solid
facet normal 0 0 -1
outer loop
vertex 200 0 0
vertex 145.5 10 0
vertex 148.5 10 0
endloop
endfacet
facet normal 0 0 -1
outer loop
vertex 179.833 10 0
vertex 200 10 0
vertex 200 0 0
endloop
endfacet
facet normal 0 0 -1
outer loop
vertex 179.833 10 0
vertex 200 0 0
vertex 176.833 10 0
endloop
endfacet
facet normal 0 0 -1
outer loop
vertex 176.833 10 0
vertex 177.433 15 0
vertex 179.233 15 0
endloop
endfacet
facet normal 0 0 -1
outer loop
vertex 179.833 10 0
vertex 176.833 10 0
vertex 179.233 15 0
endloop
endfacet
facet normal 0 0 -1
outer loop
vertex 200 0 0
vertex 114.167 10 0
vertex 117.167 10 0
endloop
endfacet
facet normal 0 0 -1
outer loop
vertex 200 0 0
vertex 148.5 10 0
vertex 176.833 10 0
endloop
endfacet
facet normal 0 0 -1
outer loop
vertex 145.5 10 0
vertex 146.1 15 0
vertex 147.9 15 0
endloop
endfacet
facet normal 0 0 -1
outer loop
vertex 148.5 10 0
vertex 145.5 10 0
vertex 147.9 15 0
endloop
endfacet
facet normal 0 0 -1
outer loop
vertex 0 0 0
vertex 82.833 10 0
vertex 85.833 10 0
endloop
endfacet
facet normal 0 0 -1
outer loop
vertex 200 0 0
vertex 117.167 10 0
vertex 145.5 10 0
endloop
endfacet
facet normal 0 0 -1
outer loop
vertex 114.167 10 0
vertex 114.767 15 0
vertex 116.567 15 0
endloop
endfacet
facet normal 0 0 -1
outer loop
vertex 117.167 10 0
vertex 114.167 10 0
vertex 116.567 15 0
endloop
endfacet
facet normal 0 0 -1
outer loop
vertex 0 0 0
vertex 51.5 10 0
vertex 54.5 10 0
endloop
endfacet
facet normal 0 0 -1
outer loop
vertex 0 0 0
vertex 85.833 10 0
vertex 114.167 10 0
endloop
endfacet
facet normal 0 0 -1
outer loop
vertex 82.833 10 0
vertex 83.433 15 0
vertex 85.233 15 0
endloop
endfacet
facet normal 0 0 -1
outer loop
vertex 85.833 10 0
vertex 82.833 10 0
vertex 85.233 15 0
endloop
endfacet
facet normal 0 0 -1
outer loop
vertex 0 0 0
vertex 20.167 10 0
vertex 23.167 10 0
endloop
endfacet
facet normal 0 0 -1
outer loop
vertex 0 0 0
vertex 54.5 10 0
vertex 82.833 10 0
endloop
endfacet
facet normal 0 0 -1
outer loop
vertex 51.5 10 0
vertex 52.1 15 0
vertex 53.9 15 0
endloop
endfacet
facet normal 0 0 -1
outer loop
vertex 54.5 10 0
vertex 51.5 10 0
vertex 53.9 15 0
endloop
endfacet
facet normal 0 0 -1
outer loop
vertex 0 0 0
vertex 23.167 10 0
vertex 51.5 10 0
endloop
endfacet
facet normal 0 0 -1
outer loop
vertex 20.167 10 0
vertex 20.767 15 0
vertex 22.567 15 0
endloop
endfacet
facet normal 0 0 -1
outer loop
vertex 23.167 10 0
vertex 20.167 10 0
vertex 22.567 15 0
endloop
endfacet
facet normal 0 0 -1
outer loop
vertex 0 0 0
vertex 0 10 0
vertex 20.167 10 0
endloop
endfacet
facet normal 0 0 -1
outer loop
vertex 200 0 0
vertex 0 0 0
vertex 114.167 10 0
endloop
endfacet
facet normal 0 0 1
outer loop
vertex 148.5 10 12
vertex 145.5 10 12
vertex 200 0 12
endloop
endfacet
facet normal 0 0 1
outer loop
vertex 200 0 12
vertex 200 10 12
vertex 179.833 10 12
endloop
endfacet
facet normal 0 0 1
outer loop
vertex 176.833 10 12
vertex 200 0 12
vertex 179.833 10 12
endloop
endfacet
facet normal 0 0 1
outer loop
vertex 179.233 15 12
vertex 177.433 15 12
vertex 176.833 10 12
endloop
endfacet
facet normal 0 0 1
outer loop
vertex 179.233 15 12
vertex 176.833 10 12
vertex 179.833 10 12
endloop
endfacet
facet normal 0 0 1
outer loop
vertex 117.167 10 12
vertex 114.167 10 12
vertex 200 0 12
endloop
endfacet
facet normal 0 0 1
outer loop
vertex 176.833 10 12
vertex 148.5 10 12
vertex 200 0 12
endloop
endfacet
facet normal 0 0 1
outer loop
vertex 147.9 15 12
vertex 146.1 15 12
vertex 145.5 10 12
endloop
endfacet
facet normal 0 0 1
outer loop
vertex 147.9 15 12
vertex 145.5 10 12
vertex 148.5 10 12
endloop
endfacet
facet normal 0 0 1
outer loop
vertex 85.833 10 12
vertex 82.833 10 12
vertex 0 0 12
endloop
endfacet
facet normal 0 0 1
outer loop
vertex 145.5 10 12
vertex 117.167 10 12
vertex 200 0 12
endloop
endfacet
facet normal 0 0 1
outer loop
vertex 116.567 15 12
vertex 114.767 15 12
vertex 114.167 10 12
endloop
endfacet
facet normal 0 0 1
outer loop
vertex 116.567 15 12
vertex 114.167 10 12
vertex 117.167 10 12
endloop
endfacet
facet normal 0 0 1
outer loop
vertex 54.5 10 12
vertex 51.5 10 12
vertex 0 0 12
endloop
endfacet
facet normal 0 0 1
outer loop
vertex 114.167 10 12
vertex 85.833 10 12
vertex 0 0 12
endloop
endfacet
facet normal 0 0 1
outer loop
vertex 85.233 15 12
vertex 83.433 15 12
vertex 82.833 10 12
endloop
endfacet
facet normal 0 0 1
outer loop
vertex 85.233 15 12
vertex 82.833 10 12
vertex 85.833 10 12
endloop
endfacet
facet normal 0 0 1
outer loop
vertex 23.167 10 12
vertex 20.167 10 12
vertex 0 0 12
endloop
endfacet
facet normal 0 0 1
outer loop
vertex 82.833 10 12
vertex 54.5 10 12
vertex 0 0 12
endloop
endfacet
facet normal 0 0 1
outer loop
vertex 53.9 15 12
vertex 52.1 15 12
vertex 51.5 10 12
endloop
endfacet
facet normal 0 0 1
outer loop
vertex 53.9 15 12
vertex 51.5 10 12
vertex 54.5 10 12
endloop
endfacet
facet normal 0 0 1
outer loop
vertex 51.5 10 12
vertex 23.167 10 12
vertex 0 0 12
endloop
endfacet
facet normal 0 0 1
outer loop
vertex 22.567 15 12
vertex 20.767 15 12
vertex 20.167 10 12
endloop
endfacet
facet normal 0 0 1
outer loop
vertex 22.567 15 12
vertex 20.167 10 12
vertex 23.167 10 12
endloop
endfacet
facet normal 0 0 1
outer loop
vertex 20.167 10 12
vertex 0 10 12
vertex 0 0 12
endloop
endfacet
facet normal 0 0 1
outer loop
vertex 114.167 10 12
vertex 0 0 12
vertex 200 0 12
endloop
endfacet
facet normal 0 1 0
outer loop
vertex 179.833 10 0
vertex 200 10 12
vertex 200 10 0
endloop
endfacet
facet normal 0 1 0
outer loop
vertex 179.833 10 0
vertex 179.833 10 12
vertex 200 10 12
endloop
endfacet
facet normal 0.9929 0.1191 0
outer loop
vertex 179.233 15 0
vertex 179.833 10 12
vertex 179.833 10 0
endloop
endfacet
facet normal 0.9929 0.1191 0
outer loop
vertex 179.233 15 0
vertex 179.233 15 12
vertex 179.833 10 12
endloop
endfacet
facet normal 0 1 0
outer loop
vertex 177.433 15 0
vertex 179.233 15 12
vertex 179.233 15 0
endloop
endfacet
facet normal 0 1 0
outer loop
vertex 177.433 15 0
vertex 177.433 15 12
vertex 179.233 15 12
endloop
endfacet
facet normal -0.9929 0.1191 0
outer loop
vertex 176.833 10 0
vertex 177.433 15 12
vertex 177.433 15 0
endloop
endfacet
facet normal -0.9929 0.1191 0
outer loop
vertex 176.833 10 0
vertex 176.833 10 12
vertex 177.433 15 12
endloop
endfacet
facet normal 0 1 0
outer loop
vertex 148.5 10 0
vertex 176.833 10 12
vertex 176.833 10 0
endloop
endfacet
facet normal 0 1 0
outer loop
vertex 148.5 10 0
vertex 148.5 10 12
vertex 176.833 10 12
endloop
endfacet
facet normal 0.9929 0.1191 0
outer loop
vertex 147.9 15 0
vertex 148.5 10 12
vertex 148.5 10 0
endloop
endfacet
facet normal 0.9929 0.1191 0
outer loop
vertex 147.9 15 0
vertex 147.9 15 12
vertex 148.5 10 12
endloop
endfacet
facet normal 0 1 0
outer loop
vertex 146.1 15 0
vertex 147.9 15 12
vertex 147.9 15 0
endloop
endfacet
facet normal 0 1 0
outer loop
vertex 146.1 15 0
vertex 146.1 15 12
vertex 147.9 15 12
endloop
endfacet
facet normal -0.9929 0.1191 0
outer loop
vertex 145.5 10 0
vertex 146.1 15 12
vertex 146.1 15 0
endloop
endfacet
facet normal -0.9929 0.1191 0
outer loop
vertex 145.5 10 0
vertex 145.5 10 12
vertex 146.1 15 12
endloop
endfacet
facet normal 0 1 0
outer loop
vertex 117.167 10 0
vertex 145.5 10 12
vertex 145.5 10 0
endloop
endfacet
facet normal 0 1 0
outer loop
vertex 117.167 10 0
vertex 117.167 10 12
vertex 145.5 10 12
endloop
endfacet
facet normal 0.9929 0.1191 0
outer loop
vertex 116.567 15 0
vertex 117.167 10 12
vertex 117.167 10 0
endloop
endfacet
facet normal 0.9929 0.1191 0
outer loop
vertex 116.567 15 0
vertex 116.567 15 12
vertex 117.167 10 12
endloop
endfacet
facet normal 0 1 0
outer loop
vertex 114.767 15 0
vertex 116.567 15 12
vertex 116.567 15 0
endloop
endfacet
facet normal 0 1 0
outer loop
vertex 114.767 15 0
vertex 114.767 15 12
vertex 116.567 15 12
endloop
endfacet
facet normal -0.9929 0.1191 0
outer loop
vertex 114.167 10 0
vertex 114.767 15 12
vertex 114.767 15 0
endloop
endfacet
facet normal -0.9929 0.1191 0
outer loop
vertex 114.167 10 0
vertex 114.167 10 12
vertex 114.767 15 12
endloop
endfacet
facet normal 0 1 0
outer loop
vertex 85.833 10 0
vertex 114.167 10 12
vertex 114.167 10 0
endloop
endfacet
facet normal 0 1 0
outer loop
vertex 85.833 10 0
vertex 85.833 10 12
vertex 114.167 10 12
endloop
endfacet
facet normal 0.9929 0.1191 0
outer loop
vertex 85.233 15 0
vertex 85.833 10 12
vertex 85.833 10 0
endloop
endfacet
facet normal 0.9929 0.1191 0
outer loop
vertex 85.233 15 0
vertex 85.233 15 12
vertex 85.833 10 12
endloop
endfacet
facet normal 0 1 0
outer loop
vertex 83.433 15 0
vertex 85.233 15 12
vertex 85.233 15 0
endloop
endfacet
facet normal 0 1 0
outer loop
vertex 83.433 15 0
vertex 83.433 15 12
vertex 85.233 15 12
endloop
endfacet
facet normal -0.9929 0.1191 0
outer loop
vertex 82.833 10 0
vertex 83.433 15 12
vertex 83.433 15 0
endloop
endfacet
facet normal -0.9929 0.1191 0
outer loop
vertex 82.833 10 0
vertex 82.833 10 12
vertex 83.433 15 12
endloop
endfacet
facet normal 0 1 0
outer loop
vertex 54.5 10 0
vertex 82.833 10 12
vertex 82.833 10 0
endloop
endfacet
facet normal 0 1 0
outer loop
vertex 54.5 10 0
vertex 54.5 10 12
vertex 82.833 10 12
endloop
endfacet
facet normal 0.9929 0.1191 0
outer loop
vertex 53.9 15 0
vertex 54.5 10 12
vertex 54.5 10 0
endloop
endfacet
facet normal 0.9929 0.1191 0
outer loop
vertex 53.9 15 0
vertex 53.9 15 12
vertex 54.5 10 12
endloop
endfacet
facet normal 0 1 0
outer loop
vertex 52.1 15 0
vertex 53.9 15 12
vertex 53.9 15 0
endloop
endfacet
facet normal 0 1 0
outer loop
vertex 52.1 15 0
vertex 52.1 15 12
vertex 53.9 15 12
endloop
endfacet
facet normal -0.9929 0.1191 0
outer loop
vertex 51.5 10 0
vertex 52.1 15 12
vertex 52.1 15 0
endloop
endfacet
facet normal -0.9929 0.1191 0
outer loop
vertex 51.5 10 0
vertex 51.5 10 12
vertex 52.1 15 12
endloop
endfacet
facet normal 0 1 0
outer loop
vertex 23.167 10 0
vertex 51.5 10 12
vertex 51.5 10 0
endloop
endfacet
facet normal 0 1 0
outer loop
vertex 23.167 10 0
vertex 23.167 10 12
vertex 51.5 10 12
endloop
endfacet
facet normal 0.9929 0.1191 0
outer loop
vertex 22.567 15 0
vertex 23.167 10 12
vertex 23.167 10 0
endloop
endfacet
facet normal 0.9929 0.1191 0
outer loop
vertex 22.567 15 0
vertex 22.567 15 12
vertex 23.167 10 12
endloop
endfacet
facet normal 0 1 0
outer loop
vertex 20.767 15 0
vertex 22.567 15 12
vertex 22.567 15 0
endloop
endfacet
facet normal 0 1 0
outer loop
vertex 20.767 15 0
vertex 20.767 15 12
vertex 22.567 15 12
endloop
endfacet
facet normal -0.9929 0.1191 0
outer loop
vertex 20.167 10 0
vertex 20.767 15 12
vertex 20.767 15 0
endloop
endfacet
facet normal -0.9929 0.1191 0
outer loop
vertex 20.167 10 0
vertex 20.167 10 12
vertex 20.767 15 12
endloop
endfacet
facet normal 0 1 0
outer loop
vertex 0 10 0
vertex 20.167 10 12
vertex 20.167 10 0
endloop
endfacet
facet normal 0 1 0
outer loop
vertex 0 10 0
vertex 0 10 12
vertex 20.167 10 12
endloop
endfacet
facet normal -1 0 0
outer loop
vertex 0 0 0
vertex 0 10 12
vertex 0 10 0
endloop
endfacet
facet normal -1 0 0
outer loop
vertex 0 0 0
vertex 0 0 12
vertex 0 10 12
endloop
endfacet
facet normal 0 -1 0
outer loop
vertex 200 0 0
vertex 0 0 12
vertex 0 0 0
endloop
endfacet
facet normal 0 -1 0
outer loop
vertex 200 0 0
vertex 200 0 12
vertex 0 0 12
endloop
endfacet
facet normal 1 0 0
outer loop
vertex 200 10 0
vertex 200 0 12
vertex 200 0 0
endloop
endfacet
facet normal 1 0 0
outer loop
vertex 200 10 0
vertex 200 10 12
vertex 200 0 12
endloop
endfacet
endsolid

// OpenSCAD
$fn = 32;

// ----------------------------------------------------------------------
// Gear rack: 6 teeth on a 200 mm bar, pitch 31.33 mm
// ----------------------------------------------------------------------

// --- parameters (mm) ---
profile_height = 12;      // extrusion height
profile_points = 28;      // points of the closed outline

profile = [[0, 0], [200, 0], [200, 10], [179.833, 10], [179.233, 15], [177.433, 15], [176.833, 10], [148.5, 10], [147.9, 15], [146.1, 15], [145.5, 10], [117.167, 10], [116.567, 15], [114.767, 15], [114.167, 10], [85.833, 10], [85.233, 15], [83.433, 15], [82.833, 10], [54.5, 10], [53.9, 15], [52.1, 15], [51.5, 10], [23.167, 10], [22.567, 15], [20.767, 15], [20.167, 10], [0, 10]];  // single closed polygon, 28 points, counter clockwise

// --- the one profile operation ---
linear_extrude(height = profile_height) polygon(points = profile);
